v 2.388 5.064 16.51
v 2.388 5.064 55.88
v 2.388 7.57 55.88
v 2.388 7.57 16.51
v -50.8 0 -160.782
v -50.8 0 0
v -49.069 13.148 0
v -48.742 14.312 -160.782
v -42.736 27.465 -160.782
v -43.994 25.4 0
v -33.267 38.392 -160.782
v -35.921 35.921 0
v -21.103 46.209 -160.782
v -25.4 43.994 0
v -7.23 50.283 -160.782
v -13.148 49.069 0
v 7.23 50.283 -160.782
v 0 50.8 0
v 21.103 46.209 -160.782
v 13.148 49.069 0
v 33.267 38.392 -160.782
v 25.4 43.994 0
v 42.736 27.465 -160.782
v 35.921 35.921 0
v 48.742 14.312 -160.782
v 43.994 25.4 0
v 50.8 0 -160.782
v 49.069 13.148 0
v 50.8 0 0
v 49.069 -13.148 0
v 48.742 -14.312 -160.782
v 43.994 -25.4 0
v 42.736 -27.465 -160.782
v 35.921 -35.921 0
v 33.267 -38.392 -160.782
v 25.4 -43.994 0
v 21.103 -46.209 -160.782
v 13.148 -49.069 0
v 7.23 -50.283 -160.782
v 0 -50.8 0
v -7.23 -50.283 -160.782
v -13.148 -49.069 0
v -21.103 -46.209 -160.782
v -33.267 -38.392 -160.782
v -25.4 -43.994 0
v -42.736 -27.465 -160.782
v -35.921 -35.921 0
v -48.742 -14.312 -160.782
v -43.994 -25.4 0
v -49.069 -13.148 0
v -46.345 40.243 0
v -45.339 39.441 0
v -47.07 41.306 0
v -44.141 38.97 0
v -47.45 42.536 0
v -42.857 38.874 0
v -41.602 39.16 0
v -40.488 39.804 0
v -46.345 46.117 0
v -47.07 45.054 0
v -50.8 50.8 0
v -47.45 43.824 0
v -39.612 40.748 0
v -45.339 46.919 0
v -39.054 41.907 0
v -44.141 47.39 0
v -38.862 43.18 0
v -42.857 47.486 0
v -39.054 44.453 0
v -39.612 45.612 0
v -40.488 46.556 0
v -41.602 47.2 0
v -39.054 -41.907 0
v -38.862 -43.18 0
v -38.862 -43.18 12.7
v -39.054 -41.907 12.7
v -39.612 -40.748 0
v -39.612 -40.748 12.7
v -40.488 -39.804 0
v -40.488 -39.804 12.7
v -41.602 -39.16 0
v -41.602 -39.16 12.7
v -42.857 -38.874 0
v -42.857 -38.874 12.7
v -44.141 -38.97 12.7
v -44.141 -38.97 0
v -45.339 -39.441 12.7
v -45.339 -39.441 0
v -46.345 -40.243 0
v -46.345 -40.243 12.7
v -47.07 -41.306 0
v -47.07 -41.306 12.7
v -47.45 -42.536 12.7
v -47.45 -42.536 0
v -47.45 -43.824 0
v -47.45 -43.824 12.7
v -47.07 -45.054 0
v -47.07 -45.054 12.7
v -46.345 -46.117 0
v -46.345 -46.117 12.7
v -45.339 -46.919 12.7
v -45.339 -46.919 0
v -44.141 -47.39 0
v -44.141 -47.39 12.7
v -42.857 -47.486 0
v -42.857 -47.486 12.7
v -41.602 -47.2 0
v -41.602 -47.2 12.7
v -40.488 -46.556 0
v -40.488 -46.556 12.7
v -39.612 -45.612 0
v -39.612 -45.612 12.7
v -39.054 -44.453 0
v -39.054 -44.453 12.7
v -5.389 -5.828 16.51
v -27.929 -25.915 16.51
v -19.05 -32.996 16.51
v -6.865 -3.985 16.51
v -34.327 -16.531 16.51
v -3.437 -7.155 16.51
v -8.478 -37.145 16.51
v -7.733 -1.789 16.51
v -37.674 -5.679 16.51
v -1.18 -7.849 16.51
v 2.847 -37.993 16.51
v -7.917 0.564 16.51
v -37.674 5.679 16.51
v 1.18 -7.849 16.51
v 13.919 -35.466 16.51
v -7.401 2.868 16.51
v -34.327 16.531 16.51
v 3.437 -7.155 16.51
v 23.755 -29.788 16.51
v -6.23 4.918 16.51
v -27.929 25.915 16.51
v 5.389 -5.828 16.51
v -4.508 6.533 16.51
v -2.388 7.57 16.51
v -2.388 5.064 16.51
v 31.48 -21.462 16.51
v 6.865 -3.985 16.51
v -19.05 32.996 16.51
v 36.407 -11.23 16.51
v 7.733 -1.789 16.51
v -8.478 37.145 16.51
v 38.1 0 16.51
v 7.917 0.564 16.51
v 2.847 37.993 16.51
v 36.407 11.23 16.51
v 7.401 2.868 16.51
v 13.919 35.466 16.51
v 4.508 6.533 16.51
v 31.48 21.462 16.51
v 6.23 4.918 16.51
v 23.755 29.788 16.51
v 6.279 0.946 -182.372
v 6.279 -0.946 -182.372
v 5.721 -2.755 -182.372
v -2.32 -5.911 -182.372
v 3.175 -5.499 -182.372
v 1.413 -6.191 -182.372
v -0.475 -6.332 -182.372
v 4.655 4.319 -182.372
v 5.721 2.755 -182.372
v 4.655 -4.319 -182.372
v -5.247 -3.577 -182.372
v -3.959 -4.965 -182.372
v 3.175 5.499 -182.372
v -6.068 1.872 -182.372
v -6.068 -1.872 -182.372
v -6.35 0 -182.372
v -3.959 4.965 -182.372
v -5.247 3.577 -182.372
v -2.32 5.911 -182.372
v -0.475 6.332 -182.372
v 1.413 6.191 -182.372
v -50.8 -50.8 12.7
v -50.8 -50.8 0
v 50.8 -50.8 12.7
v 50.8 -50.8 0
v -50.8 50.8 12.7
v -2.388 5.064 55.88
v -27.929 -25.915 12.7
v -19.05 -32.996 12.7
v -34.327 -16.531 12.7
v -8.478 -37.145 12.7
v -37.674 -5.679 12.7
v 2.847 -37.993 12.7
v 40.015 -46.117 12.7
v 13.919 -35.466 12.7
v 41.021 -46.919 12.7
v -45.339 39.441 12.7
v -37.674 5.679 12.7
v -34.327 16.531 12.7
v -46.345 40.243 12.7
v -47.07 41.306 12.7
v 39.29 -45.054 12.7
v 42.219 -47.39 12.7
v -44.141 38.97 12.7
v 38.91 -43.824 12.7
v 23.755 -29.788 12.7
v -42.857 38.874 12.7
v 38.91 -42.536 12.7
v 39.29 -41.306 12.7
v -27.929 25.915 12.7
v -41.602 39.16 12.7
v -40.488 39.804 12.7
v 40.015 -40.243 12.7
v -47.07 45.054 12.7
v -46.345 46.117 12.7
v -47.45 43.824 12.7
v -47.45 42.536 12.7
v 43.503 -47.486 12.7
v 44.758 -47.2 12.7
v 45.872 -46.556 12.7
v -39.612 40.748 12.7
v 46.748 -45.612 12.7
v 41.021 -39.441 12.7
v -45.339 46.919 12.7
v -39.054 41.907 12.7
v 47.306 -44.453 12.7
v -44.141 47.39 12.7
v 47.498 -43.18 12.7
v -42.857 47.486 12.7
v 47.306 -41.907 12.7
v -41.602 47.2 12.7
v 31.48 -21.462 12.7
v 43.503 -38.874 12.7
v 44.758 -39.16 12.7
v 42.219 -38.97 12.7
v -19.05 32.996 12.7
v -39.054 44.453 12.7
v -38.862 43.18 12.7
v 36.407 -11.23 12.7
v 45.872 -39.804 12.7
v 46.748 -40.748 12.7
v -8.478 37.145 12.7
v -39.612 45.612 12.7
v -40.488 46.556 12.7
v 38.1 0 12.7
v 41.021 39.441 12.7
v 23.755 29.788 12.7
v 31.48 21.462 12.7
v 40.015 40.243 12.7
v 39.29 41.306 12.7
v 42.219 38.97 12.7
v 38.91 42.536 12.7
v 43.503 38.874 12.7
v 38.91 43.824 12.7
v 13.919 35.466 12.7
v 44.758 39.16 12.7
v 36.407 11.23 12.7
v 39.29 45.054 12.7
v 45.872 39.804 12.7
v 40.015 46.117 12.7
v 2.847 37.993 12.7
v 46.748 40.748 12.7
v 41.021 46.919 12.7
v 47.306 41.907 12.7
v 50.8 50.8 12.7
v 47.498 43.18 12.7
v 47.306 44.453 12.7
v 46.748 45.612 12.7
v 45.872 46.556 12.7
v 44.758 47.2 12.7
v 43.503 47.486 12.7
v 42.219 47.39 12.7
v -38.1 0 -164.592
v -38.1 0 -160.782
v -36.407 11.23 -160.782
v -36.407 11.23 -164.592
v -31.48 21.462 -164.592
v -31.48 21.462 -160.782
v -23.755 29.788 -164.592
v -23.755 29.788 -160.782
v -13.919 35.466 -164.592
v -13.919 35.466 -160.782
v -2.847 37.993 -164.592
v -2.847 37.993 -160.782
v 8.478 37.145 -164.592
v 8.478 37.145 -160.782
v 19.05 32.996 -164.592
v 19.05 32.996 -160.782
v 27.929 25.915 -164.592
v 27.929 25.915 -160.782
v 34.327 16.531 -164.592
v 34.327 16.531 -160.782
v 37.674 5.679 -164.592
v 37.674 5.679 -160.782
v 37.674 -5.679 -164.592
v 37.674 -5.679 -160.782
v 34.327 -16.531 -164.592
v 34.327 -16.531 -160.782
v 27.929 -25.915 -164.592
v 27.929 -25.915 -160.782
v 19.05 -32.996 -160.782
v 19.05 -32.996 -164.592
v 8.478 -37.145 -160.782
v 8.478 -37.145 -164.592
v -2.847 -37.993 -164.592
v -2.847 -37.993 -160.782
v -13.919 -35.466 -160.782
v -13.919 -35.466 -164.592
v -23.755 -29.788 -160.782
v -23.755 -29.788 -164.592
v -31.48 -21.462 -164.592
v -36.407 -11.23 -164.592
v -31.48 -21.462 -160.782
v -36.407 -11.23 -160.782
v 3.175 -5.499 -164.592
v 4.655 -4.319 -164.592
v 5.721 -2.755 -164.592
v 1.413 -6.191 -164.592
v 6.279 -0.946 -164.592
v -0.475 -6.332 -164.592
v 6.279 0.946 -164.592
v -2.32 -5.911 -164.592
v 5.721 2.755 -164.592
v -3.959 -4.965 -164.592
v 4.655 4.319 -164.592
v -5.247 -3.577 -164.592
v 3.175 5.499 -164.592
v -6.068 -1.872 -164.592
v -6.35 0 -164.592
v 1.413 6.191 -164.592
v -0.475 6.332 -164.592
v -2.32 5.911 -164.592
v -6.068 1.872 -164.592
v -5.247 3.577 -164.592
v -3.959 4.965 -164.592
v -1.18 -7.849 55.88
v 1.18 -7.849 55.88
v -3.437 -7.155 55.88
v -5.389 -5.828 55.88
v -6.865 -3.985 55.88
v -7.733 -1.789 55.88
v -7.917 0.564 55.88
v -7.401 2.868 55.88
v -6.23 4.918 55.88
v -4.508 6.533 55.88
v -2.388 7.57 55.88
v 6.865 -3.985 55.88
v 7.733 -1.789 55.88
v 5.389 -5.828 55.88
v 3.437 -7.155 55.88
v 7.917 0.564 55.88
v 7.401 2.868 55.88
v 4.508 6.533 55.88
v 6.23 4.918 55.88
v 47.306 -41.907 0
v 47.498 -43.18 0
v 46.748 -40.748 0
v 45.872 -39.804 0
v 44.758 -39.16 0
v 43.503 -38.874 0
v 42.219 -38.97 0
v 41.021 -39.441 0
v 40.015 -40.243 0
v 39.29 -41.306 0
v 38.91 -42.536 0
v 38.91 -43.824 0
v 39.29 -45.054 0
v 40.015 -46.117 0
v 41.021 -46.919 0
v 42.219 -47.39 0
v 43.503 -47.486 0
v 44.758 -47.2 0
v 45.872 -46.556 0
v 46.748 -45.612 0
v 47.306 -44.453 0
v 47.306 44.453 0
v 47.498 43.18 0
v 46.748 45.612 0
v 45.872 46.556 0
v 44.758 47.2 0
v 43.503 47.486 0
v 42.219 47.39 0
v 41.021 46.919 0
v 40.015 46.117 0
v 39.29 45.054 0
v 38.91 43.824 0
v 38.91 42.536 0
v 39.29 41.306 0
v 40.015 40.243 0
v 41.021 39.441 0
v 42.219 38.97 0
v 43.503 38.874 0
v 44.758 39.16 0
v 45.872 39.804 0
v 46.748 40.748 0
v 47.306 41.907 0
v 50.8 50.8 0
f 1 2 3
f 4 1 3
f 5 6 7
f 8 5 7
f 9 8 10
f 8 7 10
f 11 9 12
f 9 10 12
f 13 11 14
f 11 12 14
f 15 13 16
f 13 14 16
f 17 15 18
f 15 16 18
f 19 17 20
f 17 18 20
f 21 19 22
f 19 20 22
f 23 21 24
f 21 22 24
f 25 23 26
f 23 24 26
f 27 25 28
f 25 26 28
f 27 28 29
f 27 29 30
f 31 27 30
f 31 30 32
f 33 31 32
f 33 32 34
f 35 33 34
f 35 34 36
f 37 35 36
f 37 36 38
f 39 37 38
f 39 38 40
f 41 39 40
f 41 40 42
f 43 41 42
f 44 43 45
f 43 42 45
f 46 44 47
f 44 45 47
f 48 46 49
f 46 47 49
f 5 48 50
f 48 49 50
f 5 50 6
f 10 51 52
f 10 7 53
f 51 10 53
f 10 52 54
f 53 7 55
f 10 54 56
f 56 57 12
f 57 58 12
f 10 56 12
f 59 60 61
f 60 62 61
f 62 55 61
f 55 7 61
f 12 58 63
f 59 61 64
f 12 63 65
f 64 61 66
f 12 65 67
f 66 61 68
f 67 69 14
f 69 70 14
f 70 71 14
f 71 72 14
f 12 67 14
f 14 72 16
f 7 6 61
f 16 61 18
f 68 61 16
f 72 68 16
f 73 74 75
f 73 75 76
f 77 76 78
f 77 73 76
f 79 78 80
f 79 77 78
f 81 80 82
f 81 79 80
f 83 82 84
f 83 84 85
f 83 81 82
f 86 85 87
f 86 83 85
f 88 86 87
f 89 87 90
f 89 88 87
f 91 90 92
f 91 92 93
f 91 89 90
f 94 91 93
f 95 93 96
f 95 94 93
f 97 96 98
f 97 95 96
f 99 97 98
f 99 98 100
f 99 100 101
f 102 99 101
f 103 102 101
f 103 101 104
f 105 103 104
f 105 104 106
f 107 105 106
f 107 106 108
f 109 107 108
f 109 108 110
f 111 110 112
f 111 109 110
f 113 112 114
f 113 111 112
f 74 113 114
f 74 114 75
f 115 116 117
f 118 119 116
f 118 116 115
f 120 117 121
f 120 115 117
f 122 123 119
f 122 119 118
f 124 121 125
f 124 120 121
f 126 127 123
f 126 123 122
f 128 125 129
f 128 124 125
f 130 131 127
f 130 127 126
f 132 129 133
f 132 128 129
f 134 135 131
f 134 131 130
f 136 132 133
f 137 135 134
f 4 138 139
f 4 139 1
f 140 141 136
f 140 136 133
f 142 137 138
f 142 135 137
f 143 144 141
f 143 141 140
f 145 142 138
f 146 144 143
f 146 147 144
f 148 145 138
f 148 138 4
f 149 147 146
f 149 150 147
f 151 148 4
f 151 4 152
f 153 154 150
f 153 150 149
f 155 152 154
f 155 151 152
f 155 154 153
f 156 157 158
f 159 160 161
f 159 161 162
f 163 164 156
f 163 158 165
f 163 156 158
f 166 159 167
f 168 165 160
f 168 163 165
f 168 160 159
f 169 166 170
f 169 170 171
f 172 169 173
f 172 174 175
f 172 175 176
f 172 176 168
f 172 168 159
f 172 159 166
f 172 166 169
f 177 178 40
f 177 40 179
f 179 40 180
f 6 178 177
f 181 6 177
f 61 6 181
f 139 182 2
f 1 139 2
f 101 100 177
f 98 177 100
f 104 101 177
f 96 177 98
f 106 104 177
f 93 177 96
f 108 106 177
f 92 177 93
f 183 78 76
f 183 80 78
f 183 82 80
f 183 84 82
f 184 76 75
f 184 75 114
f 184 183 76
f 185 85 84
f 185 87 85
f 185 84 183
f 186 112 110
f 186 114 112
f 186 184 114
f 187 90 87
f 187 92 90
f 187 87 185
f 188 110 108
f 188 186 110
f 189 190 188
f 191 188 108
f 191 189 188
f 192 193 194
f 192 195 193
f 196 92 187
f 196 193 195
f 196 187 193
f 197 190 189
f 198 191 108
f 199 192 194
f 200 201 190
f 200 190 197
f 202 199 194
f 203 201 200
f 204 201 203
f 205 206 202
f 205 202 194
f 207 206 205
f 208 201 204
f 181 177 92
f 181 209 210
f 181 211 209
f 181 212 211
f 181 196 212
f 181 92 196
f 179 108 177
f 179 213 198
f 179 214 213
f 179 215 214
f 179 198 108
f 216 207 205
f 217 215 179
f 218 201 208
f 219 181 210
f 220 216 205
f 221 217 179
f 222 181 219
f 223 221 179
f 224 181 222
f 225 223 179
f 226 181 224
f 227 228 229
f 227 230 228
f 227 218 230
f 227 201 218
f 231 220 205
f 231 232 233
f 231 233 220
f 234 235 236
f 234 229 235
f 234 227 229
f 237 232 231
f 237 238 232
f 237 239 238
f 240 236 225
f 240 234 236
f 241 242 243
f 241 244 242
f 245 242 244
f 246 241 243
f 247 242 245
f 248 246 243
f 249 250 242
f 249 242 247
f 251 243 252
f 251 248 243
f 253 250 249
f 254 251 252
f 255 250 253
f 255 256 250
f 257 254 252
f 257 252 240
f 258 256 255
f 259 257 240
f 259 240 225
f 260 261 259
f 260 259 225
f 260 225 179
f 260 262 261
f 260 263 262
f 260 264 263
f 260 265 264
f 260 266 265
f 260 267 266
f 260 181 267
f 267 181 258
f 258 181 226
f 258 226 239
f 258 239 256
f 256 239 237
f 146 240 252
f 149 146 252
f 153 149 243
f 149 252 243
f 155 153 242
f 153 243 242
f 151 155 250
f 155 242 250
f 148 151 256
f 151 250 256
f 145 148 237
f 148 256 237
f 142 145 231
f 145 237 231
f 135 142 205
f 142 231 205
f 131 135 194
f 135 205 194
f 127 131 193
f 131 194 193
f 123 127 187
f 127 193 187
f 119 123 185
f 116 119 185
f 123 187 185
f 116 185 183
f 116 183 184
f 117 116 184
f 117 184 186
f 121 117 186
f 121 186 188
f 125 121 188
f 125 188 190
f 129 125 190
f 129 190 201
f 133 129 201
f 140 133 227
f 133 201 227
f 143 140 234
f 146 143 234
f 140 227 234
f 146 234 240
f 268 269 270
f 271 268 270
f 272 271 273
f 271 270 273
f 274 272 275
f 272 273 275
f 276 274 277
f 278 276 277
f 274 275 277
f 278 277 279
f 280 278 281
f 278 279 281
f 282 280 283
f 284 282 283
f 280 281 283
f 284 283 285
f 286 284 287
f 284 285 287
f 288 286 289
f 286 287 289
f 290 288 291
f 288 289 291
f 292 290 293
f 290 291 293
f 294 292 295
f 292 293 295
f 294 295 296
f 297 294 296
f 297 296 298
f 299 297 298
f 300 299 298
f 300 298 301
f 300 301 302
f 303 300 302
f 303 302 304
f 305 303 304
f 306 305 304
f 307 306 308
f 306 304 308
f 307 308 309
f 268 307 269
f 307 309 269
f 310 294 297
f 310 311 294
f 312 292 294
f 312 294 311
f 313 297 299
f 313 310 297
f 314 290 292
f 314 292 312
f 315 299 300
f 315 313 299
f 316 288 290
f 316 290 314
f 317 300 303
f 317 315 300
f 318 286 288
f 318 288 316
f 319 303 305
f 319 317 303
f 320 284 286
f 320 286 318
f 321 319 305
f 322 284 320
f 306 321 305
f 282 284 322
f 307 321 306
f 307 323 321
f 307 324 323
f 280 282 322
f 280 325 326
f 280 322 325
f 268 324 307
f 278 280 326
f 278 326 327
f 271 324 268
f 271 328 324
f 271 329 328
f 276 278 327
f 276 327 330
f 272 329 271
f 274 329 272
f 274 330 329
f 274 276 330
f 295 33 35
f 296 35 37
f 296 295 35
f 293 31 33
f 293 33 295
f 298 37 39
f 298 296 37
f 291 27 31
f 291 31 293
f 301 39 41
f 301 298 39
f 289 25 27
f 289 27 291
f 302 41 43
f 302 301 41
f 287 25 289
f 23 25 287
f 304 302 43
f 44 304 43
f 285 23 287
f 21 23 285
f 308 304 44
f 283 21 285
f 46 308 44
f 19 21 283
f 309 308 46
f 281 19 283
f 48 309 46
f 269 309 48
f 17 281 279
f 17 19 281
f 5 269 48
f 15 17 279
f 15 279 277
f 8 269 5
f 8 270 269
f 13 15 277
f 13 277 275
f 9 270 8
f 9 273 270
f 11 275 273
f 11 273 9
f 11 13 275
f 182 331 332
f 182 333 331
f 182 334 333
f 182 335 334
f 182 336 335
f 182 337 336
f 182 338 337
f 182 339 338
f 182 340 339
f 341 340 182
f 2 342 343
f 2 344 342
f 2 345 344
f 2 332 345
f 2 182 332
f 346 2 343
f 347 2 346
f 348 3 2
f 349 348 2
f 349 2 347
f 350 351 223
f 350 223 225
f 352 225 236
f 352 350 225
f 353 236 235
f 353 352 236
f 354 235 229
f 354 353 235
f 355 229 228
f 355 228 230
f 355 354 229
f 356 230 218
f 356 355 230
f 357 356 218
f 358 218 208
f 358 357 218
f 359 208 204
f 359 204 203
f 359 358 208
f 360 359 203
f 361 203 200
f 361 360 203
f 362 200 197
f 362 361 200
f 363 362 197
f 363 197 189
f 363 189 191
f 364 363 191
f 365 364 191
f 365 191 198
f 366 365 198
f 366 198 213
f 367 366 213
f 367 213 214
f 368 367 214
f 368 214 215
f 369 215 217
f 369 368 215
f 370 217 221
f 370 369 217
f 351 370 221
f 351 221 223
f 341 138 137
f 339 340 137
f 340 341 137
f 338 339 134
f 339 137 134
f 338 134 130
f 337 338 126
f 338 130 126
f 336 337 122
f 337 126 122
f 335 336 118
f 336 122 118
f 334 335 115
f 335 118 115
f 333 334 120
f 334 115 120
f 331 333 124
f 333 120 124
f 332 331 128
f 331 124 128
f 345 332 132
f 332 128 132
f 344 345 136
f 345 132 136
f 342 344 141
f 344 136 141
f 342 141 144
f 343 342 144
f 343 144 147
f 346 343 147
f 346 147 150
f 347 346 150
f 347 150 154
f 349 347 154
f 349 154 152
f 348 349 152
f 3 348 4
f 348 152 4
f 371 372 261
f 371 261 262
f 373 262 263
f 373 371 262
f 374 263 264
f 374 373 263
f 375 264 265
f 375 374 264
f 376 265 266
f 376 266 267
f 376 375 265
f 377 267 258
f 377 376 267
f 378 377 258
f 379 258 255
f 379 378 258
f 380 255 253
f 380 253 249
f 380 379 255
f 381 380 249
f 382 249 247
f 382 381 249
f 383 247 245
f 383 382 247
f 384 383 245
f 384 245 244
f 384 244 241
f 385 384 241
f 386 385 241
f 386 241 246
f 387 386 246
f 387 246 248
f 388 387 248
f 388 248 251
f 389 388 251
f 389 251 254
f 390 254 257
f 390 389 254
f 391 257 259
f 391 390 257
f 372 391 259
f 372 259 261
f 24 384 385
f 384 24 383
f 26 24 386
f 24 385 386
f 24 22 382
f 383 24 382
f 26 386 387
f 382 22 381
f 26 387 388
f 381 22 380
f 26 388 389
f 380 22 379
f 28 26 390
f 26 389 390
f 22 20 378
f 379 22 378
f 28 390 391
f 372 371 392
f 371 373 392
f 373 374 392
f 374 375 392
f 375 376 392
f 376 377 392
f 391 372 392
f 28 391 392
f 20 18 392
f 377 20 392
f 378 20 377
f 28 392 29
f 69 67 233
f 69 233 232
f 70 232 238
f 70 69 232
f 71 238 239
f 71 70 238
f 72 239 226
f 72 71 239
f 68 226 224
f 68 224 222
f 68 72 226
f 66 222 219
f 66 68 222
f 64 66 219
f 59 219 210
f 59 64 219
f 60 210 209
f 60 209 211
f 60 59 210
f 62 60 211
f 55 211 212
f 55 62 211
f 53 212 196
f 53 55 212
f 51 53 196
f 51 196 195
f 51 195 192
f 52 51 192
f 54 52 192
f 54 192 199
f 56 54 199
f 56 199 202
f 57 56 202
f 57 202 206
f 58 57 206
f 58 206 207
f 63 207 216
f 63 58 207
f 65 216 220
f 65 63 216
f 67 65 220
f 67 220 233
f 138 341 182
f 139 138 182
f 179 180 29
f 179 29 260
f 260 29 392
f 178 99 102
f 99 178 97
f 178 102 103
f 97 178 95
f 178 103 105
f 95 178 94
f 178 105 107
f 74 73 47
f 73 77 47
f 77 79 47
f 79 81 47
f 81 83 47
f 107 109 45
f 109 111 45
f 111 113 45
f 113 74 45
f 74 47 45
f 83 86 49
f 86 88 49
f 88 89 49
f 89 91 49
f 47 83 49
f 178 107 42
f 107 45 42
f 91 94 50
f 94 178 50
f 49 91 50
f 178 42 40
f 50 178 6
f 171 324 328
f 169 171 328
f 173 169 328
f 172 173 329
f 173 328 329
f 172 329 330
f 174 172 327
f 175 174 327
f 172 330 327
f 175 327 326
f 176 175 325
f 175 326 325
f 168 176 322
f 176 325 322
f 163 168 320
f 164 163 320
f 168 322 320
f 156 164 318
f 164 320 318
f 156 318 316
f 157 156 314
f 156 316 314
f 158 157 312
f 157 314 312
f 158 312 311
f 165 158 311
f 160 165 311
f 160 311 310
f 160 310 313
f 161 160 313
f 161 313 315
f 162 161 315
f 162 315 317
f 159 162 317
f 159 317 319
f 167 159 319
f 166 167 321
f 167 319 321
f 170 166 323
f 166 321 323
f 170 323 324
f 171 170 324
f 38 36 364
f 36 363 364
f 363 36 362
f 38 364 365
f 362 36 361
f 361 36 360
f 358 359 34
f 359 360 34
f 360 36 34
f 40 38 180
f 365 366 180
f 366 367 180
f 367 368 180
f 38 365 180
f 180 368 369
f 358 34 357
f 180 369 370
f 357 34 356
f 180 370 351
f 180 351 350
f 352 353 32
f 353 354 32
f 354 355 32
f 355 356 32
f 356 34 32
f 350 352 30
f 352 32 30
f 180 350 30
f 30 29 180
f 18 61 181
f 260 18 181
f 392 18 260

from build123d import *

# Parameters (mm, degrees)
SKETCH1_W               = 101.6
SKETCH1_H               = 101.6
SKETCH1_R               = 4.318
BOSS_EXTRUDE1_DEPTH     = 12.7
SKETCH2_R               = 38.1
BOSS_EXTRUDE2_DEPTH     = 3.81
SKETCH4_R               = 7.9375
BOSS_EXTRUDE4_DEPTH     = 39.37
CUT_EXTRUDE1_DEPTH      = 1
CUT_EXTRUDE1_DEPTH_BACK = 39.37
SKETCH6_R               = 50.8
BOSS_EXTRUDE5_DEPTH     = 160.782
SKETCH7_R               = 38.1
BOSS_EXTRUDE6_DEPTH     = 3.81
SKETCH8_R               = 6.35
BOSS_EXTRUDE7_DEPTH     = 17.78


with BuildPart() as part:
    # Sketch1 → Boss-Extrude1 (new body)
    with BuildSketch(Plane.XY):
        Rectangle(SKETCH1_W, SKETCH1_H)
        with Locations((-43.18, -43.18)):
            Circle(SKETCH1_R, mode=Mode.SUBTRACT)
        with Locations((43.18, -43.18)):
            Circle(SKETCH1_R, mode=Mode.SUBTRACT)
        with Locations((43.18, 43.18)):
            Circle(SKETCH1_R, mode=Mode.SUBTRACT)
        with Locations((-43.18, 43.18)):
            Circle(SKETCH1_R, mode=Mode.SUBTRACT)
    extrude(amount=BOSS_EXTRUDE1_DEPTH)

    # Sketch2 → Boss-Extrude2 (add)
    with BuildSketch(Plane.XY.offset(12.7)):
        Circle(SKETCH2_R)
    extrude(amount=BOSS_EXTRUDE2_DEPTH)

    # Sketch4 → Boss-Extrude4 (add)
    with BuildSketch(Plane.XY.offset(16.51)):
        Circle(SKETCH4_R)
    extrude(amount=BOSS_EXTRUDE4_DEPTH)

    # Sketch5 → Cut-Extrude1 (cut, two sides)
    with BuildSketch(Plane.XY.offset(55.88)) as cut_extrude1_sk:
        with BuildLine():
            Line((-2.387594518, 5.063803231), (5.482e-06, 5.063803231))
            Line((5.482e-06, 5.063803231), (2.387605482, 5.063803231))
            Line((2.387605482, 5.063803231), (2.387605482, 7.569890773))
            ThreePointArc((2.387605482, 7.569890773), (5.748e-06, 7.9375), (-2.387594518, 7.569894231))
            Line((-2.387594518, 7.569894231), (-2.387594518, 5.063803231))
        make_face()
    extrude(amount=CUT_EXTRUDE1_DEPTH, mode=Mode.SUBTRACT)
    extrude(cut_extrude1_sk.sketch, amount=-CUT_EXTRUDE1_DEPTH_BACK, mode=Mode.SUBTRACT)

    # Sketch6 → Boss-Extrude5 (add)
    with BuildSketch(Plane(origin=(0, 0, 0), x_dir=(-1, 0, 0), z_dir=(0, 0, -1))):
        Circle(SKETCH6_R)
    extrude(amount=BOSS_EXTRUDE5_DEPTH)

    # Sketch7 → Boss-Extrude6 (add)
    with BuildSketch(Plane(origin=(0, 0, -160.782), x_dir=(-1, 0, 0), z_dir=(0, 0, -1))):
        Circle(SKETCH7_R)
    extrude(amount=BOSS_EXTRUDE6_DEPTH)

    # Sketch8 → Boss-Extrude7 (add)
    with BuildSketch(Plane(origin=(0, 0, -164.592), x_dir=(-1, 0, 0), z_dir=(0, 0, -1))):
        Circle(SKETCH8_R)
    extrude(amount=BOSS_EXTRUDE7_DEPTH)


solid = part.part
